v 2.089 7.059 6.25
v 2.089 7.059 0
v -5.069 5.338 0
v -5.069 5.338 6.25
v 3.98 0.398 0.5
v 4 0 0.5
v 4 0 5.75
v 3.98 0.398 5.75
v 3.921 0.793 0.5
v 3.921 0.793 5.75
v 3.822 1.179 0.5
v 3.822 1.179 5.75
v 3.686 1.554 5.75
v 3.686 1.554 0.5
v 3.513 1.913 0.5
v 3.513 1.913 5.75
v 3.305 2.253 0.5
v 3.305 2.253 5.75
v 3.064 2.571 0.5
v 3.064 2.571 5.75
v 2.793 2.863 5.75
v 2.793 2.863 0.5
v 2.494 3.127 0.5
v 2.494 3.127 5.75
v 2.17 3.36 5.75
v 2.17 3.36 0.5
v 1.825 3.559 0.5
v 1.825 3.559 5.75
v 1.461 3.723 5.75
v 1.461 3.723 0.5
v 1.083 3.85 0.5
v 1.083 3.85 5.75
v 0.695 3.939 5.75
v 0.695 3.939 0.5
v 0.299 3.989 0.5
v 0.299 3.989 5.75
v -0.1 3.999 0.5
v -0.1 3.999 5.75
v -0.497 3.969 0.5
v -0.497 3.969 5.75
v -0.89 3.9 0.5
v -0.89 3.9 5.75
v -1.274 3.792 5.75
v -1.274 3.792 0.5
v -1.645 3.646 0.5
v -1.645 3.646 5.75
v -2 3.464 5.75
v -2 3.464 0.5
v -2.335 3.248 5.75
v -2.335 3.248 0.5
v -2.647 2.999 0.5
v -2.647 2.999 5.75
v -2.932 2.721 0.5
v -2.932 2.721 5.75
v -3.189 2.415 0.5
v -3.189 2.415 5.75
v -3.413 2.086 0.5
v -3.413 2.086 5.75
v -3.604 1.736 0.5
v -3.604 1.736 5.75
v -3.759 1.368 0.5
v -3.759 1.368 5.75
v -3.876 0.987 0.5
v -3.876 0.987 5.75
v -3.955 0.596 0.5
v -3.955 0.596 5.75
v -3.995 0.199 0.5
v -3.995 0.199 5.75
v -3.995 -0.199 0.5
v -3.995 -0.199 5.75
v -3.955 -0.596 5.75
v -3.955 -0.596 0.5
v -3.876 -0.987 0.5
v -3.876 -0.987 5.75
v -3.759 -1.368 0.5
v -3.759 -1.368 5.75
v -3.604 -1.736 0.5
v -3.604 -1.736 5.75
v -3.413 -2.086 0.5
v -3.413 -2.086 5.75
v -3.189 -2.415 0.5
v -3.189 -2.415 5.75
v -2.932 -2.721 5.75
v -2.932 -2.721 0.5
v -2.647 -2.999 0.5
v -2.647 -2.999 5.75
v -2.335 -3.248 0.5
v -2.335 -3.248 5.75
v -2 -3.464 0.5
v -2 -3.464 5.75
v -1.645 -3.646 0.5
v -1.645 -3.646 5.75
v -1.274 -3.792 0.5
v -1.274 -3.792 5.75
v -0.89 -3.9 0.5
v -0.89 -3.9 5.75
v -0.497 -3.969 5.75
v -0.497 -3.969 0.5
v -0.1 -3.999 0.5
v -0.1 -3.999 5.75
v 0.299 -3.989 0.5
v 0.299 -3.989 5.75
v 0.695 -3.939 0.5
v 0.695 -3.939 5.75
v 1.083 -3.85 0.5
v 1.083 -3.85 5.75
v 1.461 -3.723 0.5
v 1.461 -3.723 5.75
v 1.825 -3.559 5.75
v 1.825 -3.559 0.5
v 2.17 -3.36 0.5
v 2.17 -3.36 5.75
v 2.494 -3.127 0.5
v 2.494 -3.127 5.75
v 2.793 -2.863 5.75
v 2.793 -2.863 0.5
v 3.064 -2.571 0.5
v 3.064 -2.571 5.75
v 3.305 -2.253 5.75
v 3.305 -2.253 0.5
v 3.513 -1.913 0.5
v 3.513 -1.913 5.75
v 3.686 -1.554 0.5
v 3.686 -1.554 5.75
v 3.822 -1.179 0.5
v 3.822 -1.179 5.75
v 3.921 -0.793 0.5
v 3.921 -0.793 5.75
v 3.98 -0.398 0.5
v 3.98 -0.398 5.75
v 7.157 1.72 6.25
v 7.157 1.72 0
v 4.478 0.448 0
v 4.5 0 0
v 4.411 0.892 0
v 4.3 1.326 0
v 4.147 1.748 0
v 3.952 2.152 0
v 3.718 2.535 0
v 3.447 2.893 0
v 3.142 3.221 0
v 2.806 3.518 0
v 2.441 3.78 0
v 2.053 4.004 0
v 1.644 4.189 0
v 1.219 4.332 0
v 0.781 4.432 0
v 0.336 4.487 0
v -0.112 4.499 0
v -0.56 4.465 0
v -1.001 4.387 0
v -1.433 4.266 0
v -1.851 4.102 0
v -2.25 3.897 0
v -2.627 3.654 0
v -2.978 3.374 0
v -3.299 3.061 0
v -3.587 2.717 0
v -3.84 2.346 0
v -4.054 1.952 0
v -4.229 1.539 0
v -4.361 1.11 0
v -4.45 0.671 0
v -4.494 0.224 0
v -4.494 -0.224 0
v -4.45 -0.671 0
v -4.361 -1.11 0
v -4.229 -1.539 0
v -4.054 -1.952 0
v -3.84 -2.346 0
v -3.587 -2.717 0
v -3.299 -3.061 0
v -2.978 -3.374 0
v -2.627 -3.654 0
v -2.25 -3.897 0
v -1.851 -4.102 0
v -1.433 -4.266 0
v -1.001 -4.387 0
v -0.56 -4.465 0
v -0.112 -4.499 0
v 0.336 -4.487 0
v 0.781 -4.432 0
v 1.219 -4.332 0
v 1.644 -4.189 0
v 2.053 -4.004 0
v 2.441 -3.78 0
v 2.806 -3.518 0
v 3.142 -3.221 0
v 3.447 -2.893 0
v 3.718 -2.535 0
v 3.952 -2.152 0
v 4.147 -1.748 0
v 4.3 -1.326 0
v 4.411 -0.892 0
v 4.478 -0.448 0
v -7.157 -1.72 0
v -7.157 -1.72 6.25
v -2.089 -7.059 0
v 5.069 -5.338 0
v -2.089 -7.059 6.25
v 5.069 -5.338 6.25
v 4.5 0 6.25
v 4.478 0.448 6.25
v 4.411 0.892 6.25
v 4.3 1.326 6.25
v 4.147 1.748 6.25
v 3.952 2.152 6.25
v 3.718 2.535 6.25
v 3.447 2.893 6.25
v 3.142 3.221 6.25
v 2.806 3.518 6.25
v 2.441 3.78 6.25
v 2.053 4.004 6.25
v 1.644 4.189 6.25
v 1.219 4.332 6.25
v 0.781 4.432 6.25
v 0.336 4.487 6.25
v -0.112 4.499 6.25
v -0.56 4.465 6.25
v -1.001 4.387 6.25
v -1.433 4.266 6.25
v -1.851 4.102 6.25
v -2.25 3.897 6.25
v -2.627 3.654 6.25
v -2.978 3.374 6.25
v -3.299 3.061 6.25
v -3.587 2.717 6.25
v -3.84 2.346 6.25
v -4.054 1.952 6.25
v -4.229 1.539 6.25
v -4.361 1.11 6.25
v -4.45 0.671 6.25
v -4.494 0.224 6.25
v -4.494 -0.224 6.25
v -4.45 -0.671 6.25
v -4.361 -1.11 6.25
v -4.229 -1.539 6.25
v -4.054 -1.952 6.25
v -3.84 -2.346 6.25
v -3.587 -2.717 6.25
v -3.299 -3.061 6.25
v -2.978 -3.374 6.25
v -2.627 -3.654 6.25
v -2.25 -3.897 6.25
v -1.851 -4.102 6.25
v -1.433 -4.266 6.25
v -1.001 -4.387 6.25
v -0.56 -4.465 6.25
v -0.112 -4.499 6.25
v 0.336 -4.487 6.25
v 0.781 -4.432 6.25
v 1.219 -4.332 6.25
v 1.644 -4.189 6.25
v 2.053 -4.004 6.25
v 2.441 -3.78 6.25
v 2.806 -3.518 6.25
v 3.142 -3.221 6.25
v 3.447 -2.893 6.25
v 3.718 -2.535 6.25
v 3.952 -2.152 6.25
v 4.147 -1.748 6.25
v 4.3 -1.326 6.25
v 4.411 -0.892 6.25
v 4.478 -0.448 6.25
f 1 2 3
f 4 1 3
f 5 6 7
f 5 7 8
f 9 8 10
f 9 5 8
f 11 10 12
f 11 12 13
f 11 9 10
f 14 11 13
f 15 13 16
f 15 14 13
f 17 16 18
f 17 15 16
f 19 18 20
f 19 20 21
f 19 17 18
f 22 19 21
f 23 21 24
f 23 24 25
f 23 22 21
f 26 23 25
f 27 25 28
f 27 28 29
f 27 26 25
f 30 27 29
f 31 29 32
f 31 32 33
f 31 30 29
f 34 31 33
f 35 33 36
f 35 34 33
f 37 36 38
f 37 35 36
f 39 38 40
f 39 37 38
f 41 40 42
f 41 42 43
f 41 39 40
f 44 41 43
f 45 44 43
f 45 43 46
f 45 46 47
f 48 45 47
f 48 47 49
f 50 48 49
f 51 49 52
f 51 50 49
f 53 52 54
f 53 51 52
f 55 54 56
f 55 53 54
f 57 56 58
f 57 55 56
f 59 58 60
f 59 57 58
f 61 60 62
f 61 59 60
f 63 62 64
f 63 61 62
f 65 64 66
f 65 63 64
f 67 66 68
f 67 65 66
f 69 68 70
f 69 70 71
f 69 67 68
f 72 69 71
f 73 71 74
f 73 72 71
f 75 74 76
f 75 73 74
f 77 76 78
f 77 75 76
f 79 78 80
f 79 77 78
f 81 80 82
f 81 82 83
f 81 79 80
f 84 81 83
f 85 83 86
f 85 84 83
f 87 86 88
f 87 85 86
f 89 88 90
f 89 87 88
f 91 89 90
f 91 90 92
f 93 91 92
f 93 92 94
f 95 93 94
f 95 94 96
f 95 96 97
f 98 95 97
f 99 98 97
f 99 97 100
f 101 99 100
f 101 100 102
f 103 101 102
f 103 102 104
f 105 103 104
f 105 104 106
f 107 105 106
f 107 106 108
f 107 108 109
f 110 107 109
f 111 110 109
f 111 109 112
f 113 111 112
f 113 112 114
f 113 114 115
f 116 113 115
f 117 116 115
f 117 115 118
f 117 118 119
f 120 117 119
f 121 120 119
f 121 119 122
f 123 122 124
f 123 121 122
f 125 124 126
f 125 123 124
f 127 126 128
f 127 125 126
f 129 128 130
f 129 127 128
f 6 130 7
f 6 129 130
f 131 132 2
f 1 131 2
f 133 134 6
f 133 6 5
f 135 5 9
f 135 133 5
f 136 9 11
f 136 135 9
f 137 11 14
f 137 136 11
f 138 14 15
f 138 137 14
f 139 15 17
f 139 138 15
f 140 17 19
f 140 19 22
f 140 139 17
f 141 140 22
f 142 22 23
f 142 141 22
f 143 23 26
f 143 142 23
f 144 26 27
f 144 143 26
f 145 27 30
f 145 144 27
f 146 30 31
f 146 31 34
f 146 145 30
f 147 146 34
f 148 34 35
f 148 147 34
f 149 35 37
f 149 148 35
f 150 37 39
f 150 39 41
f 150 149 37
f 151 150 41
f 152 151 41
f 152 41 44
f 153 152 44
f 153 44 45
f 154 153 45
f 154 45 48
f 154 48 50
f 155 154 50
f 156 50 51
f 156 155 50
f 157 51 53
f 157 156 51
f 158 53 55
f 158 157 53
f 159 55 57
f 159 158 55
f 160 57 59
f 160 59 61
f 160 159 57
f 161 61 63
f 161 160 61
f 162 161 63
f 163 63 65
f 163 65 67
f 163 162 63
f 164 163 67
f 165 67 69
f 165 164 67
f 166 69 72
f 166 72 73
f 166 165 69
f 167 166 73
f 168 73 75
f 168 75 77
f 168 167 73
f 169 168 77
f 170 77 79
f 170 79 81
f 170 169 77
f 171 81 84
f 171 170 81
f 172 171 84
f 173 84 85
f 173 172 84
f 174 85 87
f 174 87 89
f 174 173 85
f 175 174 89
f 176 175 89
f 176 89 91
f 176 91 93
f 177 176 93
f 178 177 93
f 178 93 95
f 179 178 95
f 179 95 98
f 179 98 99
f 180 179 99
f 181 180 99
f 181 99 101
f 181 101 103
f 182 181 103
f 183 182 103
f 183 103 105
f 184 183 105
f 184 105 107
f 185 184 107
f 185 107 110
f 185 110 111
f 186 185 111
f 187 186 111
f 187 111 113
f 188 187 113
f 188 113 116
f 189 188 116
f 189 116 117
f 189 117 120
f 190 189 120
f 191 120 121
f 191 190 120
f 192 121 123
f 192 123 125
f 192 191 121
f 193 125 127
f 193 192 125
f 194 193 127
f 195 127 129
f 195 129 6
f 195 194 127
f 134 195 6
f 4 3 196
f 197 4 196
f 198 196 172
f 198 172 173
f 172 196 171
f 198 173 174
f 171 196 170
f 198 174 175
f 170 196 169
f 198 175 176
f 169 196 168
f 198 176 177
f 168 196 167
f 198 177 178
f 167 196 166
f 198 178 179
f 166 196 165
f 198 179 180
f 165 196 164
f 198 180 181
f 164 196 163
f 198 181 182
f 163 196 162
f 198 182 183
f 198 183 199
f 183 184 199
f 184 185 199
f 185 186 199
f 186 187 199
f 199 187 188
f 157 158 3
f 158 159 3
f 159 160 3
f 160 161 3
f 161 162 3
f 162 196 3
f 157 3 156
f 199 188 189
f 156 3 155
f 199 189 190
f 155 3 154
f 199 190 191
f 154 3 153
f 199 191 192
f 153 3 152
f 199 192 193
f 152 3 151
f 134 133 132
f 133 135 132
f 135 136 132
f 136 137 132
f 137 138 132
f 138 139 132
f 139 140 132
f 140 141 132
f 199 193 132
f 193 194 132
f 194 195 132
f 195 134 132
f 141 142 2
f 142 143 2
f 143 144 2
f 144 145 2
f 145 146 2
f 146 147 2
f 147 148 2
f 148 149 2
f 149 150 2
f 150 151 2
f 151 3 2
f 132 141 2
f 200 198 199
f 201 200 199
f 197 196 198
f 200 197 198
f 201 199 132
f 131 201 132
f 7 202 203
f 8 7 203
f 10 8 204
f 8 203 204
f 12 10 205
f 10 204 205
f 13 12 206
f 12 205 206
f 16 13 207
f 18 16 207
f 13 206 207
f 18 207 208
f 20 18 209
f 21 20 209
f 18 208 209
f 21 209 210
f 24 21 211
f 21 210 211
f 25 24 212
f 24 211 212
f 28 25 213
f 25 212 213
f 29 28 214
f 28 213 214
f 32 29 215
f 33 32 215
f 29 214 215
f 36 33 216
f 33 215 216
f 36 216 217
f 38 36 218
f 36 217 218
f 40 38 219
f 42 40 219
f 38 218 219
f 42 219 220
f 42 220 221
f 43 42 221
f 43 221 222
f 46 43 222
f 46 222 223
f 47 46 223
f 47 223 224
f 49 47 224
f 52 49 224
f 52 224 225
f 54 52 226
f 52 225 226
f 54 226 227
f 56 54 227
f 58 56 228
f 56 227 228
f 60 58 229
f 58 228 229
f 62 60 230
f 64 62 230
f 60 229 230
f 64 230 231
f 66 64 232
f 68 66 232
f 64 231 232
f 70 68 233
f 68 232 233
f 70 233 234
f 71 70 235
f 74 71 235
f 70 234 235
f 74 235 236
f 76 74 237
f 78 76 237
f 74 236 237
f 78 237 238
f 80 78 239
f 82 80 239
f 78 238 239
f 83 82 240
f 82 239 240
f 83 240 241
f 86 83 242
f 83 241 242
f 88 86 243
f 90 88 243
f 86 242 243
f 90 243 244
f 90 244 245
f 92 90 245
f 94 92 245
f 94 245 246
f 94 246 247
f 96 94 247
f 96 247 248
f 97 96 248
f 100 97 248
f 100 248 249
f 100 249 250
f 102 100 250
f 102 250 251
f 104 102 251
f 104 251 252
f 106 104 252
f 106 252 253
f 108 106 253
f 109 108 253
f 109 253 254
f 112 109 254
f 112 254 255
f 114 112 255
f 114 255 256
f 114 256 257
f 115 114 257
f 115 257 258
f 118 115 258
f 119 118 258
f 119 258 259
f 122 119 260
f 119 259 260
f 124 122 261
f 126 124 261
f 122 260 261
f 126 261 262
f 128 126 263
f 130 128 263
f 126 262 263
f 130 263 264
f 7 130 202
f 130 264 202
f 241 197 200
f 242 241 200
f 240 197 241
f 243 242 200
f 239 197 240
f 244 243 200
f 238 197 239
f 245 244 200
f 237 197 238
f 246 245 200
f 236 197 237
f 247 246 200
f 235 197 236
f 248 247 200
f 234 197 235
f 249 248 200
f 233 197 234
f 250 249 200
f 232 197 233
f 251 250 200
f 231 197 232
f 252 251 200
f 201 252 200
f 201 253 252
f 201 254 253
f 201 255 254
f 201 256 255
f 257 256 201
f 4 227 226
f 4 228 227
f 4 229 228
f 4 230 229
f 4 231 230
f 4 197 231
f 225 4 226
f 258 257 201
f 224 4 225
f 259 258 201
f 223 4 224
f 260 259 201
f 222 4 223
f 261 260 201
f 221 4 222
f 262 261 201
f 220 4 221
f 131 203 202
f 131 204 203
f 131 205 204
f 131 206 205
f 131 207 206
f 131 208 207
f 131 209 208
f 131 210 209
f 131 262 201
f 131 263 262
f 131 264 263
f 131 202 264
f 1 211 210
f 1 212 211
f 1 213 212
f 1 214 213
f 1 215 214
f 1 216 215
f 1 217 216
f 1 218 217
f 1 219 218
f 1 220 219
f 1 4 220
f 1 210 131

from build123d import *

# Parameters (mm, degrees)
SKETCH1_R       = 4
NUT_DEPTH       = 6.25
CHANFREIN1_SIZE = 0.5


with BuildPart() as part:
    # Sketch1 → NUT (new body)
    with BuildSketch(Plane.XY):
        Polygon((-5.068605871, 5.338233277), (-7.157348565, -1.720424807), (-2.088742694, -7.058658085), (5.068605871, -5.338233277), (7.157348565, 1.720424807), (2.088742694, 7.058658085), align=None)
        Circle(SKETCH1_R, mode=Mode.SUBTRACT)
    extrude(amount=NUT_DEPTH)

    # Chanfrein1
    chanfrein1_edges = [part.edges().sort_by_distance(p)[0] for p in [
        (-4, 0, 0),
        (-4, 0, 6.25),
    ]]
    chamfer(chanfrein1_edges, length=CHANFREIN1_SIZE)


solid = part.part
